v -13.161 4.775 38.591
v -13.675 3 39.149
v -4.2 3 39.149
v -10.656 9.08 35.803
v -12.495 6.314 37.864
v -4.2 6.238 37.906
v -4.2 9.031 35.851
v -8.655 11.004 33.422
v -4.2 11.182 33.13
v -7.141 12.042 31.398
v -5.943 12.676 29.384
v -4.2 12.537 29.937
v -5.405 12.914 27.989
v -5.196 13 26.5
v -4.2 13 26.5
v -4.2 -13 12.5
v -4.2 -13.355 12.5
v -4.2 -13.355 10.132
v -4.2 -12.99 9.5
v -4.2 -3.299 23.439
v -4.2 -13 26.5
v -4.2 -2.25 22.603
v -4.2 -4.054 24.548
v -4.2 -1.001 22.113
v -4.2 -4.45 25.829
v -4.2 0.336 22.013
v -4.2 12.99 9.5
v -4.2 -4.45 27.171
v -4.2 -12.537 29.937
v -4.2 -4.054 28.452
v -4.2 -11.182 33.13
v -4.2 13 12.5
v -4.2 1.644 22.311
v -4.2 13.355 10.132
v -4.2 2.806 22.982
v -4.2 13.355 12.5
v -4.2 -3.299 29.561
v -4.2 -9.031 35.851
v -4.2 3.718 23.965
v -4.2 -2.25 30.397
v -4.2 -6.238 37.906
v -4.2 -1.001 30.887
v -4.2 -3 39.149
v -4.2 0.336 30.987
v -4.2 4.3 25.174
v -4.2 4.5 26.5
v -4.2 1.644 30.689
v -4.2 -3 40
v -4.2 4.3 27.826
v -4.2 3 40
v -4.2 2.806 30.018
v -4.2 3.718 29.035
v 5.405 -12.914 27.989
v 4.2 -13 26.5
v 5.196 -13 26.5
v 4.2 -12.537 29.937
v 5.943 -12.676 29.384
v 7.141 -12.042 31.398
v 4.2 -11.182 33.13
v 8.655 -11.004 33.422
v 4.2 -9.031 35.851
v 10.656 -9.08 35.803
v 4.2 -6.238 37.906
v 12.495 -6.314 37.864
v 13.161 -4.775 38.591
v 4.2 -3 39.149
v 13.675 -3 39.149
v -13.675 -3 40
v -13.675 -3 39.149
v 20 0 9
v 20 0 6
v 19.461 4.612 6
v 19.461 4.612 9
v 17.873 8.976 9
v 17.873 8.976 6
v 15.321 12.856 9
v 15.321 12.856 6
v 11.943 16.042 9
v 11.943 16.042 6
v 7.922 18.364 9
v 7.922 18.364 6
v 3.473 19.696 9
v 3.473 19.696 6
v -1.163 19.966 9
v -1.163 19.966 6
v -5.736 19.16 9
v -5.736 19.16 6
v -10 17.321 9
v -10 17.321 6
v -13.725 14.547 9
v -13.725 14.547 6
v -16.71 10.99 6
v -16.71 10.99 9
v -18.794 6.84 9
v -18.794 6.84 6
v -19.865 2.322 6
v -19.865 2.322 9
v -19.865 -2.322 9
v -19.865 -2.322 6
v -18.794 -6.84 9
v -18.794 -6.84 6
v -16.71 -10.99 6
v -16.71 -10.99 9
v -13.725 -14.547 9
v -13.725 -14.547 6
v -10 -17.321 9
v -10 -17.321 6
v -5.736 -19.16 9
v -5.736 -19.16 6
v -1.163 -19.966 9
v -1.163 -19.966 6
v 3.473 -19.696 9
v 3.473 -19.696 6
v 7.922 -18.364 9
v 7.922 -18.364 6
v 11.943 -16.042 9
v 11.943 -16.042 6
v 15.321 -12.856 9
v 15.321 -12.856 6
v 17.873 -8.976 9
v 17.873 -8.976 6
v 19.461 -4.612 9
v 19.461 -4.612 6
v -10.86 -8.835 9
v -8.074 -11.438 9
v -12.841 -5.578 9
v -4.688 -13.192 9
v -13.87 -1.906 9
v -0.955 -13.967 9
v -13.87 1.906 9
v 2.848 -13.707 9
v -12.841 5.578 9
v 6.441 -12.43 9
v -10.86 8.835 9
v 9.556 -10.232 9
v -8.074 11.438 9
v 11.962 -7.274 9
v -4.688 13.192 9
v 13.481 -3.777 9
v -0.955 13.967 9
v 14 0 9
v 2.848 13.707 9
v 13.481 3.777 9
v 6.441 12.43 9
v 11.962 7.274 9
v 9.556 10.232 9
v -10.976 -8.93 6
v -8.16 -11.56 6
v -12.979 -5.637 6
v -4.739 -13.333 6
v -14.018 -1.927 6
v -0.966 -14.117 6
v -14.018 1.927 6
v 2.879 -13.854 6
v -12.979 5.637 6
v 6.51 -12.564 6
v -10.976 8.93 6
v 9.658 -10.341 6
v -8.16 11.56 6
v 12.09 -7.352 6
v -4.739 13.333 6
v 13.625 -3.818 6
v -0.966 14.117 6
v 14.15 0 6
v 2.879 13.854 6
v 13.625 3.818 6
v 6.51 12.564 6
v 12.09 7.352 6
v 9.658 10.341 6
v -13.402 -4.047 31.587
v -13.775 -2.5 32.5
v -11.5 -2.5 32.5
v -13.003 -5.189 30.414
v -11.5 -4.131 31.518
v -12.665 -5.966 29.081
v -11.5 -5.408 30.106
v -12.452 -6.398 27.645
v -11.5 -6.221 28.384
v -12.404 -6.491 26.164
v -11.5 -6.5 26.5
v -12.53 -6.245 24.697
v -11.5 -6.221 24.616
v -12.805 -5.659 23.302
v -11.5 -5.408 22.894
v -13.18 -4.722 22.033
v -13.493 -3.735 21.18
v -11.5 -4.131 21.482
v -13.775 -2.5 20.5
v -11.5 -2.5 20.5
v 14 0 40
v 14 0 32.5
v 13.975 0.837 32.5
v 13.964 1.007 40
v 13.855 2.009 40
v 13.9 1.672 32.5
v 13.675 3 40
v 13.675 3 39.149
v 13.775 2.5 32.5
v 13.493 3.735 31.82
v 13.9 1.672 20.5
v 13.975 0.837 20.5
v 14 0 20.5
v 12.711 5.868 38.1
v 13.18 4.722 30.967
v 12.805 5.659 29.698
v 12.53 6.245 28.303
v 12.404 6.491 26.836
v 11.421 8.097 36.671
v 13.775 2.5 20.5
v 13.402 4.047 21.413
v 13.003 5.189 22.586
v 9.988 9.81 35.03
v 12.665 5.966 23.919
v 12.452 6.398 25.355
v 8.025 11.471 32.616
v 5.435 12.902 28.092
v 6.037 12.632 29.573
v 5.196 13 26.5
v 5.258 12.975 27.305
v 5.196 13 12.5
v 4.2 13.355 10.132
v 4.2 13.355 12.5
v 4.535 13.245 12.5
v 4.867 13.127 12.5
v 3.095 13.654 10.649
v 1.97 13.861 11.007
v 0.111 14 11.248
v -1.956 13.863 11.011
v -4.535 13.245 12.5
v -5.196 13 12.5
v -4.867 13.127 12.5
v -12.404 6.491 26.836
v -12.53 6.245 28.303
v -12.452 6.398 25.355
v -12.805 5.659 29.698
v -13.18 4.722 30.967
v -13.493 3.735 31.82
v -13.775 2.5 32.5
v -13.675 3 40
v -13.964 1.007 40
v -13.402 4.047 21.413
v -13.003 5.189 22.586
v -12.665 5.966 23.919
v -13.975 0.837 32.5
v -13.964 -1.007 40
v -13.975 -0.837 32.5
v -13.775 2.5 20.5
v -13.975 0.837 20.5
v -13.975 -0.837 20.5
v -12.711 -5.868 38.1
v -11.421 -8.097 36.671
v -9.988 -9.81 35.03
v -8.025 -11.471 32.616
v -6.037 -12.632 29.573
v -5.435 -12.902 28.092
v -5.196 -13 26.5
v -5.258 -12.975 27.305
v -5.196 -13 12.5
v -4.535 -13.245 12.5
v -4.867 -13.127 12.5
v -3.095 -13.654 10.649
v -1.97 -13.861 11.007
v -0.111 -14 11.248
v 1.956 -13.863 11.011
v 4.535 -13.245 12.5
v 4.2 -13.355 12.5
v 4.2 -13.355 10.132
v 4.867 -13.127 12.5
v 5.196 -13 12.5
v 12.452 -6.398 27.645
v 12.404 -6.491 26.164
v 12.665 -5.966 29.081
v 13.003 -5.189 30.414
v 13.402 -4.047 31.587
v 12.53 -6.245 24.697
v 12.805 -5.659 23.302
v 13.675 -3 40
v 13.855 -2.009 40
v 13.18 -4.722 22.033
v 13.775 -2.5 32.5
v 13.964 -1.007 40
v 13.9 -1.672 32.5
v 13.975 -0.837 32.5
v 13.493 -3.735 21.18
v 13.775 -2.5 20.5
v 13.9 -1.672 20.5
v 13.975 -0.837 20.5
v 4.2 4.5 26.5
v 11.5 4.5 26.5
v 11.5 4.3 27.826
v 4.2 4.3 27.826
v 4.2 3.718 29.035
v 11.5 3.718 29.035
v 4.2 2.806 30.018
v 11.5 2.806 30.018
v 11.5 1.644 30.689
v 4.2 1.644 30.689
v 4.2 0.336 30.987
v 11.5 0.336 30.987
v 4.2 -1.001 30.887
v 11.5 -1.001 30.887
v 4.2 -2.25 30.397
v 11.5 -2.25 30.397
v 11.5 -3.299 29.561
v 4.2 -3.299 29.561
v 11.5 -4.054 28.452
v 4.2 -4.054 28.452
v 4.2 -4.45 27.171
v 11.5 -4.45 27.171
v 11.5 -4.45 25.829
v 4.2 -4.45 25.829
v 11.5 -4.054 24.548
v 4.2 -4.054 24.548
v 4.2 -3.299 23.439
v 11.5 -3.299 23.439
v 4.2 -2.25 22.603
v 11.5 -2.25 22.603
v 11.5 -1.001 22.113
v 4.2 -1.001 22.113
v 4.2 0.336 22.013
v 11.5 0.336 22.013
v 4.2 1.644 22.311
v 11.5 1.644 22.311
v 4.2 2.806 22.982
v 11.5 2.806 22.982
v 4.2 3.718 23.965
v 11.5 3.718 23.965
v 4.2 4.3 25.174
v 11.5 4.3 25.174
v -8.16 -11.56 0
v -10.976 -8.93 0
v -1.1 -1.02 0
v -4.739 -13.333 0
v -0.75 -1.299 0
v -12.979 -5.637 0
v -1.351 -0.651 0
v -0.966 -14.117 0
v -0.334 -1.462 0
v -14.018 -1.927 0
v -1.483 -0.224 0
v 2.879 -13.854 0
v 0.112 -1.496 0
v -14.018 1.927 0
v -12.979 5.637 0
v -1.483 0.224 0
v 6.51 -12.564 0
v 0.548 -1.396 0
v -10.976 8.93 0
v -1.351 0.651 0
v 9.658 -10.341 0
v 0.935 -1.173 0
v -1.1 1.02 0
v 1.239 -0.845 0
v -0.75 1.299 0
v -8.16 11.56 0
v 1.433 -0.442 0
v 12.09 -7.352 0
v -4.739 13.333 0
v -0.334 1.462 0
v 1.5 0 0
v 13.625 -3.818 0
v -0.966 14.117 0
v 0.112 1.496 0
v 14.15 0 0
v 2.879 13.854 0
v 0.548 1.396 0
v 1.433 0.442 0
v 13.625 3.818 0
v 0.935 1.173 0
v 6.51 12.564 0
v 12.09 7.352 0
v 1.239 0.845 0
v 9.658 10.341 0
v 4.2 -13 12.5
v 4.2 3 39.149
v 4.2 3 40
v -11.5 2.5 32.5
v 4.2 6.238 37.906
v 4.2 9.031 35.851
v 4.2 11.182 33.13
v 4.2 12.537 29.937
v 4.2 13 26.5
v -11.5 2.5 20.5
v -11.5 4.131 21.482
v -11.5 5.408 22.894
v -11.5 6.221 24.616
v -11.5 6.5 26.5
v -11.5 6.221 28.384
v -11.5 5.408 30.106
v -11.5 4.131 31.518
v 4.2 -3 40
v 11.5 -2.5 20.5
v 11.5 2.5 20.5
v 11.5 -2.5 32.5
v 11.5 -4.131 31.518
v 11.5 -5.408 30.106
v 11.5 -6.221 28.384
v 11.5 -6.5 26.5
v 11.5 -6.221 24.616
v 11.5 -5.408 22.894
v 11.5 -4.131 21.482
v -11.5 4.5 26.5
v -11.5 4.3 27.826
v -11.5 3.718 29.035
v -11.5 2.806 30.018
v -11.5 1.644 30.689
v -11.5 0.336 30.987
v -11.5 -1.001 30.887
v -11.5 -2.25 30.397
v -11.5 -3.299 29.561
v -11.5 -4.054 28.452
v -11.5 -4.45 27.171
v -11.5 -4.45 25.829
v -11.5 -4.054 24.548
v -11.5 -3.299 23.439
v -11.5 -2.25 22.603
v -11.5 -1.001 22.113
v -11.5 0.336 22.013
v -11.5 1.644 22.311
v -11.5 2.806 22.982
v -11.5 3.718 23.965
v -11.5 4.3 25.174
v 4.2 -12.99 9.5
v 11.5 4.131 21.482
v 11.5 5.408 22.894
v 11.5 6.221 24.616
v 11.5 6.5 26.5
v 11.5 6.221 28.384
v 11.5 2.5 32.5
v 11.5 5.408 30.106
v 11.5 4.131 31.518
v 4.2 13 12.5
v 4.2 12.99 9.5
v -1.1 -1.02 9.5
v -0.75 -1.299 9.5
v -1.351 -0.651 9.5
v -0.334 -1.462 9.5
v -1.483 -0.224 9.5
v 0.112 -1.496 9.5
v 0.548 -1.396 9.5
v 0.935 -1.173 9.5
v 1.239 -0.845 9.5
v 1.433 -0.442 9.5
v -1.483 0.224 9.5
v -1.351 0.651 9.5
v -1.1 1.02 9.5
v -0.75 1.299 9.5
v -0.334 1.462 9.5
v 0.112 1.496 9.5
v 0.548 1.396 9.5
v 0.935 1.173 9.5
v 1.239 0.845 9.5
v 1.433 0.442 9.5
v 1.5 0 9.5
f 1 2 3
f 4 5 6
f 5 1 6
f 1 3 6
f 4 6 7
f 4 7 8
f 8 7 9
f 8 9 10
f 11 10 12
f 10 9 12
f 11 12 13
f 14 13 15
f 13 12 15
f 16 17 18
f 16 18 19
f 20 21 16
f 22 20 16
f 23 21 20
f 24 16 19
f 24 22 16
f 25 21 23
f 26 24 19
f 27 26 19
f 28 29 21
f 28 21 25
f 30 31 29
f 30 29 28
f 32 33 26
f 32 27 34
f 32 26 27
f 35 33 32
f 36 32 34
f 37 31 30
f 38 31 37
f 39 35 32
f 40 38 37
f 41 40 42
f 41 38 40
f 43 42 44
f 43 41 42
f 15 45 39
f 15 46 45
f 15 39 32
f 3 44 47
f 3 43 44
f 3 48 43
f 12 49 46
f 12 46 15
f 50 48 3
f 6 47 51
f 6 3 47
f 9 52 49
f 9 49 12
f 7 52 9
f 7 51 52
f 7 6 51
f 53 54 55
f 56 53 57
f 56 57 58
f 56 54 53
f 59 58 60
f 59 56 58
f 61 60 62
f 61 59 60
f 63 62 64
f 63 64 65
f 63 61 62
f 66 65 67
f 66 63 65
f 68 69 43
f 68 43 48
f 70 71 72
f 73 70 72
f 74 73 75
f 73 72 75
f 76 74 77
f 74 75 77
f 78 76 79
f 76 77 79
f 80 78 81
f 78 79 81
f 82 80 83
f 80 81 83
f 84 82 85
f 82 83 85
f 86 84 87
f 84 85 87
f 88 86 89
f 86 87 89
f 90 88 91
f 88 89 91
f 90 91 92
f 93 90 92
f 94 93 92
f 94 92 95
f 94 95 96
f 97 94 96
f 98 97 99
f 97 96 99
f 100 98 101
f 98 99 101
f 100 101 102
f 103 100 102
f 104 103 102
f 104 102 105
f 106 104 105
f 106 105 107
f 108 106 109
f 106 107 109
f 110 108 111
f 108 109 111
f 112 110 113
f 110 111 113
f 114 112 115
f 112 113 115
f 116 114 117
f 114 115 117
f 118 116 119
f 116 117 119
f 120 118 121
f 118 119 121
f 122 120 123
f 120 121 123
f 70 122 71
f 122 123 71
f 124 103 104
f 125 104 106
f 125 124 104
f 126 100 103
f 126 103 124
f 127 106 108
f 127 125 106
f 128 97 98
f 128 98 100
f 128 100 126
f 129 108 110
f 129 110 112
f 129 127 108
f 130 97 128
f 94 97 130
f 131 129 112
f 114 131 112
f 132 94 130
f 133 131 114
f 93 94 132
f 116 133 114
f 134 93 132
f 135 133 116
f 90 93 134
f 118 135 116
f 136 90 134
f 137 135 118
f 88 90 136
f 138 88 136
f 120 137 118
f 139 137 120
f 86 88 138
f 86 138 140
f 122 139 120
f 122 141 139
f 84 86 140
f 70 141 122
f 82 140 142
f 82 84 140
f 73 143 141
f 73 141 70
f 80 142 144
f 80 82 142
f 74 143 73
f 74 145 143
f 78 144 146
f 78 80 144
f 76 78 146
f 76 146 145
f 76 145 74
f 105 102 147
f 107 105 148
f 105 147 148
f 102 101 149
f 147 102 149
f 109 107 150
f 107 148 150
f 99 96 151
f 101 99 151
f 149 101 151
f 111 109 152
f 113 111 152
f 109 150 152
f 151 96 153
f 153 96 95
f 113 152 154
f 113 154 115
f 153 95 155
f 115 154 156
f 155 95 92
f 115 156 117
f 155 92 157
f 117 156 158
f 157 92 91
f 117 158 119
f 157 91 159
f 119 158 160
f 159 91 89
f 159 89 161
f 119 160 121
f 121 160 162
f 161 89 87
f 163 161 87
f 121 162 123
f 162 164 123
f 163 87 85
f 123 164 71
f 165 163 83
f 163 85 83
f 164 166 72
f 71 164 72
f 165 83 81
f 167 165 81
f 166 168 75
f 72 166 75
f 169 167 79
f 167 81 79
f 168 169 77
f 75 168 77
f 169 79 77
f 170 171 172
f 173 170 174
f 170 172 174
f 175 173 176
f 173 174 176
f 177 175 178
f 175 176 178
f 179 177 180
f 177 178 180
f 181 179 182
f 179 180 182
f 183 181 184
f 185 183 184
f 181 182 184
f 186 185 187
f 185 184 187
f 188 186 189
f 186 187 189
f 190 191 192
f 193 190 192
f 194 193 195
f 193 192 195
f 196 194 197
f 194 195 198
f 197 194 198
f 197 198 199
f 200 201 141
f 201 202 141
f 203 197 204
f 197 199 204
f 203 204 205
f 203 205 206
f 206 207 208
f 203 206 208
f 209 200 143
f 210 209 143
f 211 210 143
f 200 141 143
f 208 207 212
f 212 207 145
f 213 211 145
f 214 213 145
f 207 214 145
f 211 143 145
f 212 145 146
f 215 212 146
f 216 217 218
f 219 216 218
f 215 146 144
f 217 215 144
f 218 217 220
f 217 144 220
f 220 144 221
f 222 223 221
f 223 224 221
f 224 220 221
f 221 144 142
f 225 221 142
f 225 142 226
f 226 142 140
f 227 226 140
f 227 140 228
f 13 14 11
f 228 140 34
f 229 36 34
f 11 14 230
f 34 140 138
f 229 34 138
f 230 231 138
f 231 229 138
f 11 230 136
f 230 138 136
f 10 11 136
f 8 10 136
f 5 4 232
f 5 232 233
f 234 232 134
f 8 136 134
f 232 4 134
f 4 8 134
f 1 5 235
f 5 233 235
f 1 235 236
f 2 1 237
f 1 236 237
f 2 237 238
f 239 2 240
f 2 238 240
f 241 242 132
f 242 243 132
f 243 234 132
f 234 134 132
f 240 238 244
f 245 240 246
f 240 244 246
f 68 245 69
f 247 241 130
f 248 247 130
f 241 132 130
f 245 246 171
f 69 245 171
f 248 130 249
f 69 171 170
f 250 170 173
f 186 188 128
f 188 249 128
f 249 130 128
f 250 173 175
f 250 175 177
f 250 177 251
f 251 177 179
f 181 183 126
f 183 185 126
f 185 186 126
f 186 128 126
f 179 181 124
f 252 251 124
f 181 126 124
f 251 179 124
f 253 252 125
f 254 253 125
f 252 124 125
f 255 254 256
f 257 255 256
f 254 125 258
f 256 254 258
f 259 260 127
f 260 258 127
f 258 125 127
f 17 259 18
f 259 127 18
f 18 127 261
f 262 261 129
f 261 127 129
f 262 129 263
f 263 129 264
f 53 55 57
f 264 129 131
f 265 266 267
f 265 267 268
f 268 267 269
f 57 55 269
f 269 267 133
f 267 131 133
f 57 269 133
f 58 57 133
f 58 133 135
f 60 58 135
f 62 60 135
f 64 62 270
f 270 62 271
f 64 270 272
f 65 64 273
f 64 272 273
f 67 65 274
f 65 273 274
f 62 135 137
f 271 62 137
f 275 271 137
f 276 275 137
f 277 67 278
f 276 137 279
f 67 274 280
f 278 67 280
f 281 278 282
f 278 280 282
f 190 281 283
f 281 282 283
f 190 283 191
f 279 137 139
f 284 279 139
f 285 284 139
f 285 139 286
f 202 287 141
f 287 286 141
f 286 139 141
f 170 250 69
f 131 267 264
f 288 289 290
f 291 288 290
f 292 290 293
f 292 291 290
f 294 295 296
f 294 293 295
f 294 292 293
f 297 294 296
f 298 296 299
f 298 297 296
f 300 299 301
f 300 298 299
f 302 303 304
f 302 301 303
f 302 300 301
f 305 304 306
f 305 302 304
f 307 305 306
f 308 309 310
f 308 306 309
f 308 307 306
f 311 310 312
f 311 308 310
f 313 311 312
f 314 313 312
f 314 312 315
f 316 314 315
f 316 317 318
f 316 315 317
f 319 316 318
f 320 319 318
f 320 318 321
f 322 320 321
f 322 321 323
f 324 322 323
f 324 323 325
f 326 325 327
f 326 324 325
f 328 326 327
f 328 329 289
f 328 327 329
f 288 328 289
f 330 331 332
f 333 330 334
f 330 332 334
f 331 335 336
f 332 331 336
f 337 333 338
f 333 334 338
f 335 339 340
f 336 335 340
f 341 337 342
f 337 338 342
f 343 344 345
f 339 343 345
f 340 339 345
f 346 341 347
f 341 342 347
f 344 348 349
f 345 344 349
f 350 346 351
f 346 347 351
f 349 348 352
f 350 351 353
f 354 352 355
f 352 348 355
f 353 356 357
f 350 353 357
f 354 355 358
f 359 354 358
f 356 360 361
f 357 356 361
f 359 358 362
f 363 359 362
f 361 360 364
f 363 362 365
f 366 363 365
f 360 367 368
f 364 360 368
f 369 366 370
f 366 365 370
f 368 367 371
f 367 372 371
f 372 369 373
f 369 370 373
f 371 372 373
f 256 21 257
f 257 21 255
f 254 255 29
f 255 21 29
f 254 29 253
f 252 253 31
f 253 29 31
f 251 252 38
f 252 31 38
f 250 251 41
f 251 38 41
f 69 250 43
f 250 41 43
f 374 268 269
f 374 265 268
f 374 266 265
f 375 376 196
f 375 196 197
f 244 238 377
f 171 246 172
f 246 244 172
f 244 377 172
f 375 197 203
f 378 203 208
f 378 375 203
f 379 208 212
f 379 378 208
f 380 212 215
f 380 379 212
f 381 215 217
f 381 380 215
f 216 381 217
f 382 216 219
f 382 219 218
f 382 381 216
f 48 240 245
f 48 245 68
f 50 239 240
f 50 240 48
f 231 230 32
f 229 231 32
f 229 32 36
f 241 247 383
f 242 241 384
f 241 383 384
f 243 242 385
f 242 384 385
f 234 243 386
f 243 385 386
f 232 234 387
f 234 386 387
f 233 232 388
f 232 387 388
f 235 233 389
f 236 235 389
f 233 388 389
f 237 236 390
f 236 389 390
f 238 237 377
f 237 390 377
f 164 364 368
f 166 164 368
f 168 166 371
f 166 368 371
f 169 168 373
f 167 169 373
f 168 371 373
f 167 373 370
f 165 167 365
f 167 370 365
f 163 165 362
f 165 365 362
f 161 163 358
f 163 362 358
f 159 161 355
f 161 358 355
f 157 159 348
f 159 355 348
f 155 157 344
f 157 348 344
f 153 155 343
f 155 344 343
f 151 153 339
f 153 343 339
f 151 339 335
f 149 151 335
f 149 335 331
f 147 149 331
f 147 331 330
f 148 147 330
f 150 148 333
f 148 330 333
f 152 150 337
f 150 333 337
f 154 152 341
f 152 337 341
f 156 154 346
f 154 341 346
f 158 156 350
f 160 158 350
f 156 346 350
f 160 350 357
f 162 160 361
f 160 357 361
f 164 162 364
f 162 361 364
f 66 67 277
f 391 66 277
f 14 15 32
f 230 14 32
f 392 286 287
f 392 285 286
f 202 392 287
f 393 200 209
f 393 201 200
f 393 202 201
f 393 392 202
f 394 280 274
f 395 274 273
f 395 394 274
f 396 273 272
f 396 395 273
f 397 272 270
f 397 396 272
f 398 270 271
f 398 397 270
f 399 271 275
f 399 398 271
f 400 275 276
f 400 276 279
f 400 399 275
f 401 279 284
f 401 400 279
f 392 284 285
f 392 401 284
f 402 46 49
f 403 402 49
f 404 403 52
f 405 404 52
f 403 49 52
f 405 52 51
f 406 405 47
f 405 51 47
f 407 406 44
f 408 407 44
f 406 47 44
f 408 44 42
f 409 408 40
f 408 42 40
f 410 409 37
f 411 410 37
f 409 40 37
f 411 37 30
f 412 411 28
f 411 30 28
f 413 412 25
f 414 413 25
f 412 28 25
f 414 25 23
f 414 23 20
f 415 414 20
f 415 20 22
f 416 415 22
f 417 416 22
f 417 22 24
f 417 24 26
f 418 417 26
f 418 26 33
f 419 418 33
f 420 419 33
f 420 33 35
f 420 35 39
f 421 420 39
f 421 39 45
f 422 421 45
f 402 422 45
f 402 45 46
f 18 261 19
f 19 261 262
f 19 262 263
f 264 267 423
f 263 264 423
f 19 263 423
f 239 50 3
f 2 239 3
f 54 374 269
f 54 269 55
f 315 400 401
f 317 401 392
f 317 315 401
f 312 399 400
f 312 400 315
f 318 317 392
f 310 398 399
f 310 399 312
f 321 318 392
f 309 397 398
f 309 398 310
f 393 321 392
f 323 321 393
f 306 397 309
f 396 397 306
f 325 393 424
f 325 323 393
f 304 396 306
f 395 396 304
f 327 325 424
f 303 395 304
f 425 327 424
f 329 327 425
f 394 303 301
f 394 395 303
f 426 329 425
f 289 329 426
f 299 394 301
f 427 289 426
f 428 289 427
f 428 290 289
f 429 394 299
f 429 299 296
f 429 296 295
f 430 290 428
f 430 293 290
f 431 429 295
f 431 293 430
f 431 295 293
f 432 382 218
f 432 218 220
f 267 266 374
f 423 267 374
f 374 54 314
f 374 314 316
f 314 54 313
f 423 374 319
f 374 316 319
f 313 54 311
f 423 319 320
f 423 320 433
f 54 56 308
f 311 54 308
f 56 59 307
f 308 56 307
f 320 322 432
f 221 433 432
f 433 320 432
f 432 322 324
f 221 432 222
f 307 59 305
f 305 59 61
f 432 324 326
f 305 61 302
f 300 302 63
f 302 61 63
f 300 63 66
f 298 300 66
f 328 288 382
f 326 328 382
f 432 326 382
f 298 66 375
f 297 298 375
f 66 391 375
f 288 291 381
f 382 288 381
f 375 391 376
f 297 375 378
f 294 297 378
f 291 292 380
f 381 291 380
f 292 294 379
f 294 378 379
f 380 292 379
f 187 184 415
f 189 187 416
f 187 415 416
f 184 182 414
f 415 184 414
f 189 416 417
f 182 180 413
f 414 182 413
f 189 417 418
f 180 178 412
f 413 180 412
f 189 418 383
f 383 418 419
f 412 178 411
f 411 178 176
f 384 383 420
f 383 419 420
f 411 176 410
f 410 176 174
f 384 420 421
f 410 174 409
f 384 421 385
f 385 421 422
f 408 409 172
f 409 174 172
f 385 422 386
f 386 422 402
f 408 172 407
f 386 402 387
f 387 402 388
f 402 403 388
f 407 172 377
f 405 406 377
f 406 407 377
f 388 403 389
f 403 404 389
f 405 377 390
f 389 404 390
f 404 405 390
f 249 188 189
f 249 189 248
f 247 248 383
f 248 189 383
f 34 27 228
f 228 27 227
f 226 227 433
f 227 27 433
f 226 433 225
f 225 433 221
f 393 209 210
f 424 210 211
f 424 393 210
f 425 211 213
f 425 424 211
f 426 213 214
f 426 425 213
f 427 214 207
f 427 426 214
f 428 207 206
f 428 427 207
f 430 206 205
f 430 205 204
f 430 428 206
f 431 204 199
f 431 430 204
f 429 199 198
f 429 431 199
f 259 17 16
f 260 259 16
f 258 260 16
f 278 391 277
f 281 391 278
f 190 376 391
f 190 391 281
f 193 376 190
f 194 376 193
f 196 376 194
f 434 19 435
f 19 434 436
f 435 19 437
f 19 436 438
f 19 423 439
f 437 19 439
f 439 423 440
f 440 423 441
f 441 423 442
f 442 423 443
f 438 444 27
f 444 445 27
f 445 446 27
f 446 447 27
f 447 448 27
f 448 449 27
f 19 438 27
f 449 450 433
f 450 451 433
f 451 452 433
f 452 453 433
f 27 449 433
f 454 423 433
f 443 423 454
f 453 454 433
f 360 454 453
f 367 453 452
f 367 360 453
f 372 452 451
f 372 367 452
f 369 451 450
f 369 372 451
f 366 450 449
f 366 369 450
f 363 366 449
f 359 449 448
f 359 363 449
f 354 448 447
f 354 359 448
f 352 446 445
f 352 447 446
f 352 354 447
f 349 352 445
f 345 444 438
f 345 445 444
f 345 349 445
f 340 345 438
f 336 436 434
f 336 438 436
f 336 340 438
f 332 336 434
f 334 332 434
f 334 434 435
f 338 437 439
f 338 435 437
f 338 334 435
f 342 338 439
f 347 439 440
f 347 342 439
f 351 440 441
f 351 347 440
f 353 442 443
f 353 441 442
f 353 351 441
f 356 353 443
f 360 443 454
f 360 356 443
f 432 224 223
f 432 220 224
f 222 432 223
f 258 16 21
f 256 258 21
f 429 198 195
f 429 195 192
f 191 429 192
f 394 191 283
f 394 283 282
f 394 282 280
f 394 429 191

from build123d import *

# Parameters (mm, degrees)
F0_R           = 14.15
F0_R_2         = 1.5
F1_DEPTH       = 6
F2_R           = 20
F2_R_2         = 1.5
F3_DEPTH       = 3
F4_R           = 14
F4_R_2         = 1.5
F5_DEPTH       = 31
F6_R           = 4.5
F7_DEPTH       = 20.001
F7_DEPTH_BACK  = 20.001
F9_DEPTH       = 4.2
F11_DEPTH      = 20.001
F11_DEPTH_BACK = 20.001
F14_DEPTH      = 25
F17_DEPTH      = 25


with BuildPart() as f1:
    # F0 (on Top) → F1 (new body)
    with BuildSketch(Plane.XY):
        Circle(F0_R)
        Circle(F0_R_2, mode=Mode.SUBTRACT)
    extrude(amount=F1_DEPTH)

    # F2 (on face) → F3 (join)
    with BuildSketch(Plane.XY.offset(6)):
        Circle(F2_R)
        Circle(F2_R_2, mode=Mode.SUBTRACT)
    extrude(amount=F3_DEPTH)

    # F4 (on face) → F5 (join)
    with BuildSketch(Plane.XY.offset(9)):
        Circle(F4_R)
        Circle(F4_R_2, mode=Mode.SUBTRACT)
    extrude(amount=F5_DEPTH)

    # F6 (on Right) → F7 (cut, two sides)
    with BuildSketch(Plane.YZ) as f7_sk:
        with Locations((0, 26.5)):
            Circle(F6_R)
    extrude(amount=-F7_DEPTH, mode=Mode.SUBTRACT)
    extrude(f7_sk.sketch, amount=F7_DEPTH_BACK, mode=Mode.SUBTRACT)

    # F8 (on Right) → F9 (cut, symmetric)
    with BuildSketch(Plane.YZ):
        Polygon((-12.9903810568, 9.5), (12.9903810568, 9.5), (25.9807621135, 32), (25.9807621135, 52.7080496021), (-25.9807621135, 52.7080496021), (-25.9807621135, 32), align=None)
    extrude(amount=F9_DEPTH, both=True, mode=Mode.SUBTRACT)

    # F10 (on Right) → F11 (cut, two sides)
    with BuildSketch(Plane.YZ) as f11_sk:
        with BuildLine():
            Line((-3, 39.1491106407), (-3, 43.1880317001))
            Line((-3, 43.1880317001), (3, 43.1880317001))
            Line((3, 43.1880317001), (3, 39.1491106407))
            ThreePointArc((3, 39.1491106407), (10.1980390272, 34.5622577483), (13, 26.5))
            Line((13, 26.5), (13, 12.5))
            Line((13, 12.5), (19.3005313302, 12.5))
            Line((19.3005313302, 12.5), (19.3005313302, 47.1742767518))
            Line((19.3005313302, 47.1742767518), (-17.3973576033, 47.1742767518))
            Line((-17.3973576033, 47.1742767518), (-17.4070411782, 12.5))
            Line((-17.4070411782, 12.5), (-13, 12.5))
            Line((-13, 12.5), (-13, 26.5))
            ThreePointArc((-13, 26.5), (-10.1980390272, 34.5622577483), (-3, 39.1491106407))
        make_face()
    extrude(amount=-F11_DEPTH, mode=Mode.SUBTRACT)
    extrude(f11_sk.sketch, amount=F11_DEPTH_BACK, mode=Mode.SUBTRACT)

    # F13 (on offset) → F14 (cut)
    with BuildSketch(Plane.YZ.offset(11.5)):
        with BuildLine():
            Line((2.5, 32.5), (-2.5, 32.5))
            ThreePointArc((-2.5, 32.5), (-6.5, 26.5), (-2.5, 20.5))
            Line((-2.5, 20.5), (2.5, 20.5))
            ThreePointArc((2.5, 20.5), (6.5, 26.5), (2.5, 32.5))
        make_face()
    extrude(amount=F14_DEPTH, mode=Mode.SUBTRACT)

    # F16 (on offset) → F17 (cut)
    with BuildSketch(Plane.YZ.offset(-11.5)):
        with BuildLine():
            Line((2.5, 32.5), (-2.5, 32.5))
            ThreePointArc((-2.5, 32.5), (-6.5, 26.5), (-2.5, 20.5))
            Line((-2.5, 20.5), (2.5, 20.5))
            ThreePointArc((2.5, 20.5), (6.5, 26.5), (2.5, 32.5))
        make_face()
    extrude(amount=-F17_DEPTH, mode=Mode.SUBTRACT)


solid = f1.part
